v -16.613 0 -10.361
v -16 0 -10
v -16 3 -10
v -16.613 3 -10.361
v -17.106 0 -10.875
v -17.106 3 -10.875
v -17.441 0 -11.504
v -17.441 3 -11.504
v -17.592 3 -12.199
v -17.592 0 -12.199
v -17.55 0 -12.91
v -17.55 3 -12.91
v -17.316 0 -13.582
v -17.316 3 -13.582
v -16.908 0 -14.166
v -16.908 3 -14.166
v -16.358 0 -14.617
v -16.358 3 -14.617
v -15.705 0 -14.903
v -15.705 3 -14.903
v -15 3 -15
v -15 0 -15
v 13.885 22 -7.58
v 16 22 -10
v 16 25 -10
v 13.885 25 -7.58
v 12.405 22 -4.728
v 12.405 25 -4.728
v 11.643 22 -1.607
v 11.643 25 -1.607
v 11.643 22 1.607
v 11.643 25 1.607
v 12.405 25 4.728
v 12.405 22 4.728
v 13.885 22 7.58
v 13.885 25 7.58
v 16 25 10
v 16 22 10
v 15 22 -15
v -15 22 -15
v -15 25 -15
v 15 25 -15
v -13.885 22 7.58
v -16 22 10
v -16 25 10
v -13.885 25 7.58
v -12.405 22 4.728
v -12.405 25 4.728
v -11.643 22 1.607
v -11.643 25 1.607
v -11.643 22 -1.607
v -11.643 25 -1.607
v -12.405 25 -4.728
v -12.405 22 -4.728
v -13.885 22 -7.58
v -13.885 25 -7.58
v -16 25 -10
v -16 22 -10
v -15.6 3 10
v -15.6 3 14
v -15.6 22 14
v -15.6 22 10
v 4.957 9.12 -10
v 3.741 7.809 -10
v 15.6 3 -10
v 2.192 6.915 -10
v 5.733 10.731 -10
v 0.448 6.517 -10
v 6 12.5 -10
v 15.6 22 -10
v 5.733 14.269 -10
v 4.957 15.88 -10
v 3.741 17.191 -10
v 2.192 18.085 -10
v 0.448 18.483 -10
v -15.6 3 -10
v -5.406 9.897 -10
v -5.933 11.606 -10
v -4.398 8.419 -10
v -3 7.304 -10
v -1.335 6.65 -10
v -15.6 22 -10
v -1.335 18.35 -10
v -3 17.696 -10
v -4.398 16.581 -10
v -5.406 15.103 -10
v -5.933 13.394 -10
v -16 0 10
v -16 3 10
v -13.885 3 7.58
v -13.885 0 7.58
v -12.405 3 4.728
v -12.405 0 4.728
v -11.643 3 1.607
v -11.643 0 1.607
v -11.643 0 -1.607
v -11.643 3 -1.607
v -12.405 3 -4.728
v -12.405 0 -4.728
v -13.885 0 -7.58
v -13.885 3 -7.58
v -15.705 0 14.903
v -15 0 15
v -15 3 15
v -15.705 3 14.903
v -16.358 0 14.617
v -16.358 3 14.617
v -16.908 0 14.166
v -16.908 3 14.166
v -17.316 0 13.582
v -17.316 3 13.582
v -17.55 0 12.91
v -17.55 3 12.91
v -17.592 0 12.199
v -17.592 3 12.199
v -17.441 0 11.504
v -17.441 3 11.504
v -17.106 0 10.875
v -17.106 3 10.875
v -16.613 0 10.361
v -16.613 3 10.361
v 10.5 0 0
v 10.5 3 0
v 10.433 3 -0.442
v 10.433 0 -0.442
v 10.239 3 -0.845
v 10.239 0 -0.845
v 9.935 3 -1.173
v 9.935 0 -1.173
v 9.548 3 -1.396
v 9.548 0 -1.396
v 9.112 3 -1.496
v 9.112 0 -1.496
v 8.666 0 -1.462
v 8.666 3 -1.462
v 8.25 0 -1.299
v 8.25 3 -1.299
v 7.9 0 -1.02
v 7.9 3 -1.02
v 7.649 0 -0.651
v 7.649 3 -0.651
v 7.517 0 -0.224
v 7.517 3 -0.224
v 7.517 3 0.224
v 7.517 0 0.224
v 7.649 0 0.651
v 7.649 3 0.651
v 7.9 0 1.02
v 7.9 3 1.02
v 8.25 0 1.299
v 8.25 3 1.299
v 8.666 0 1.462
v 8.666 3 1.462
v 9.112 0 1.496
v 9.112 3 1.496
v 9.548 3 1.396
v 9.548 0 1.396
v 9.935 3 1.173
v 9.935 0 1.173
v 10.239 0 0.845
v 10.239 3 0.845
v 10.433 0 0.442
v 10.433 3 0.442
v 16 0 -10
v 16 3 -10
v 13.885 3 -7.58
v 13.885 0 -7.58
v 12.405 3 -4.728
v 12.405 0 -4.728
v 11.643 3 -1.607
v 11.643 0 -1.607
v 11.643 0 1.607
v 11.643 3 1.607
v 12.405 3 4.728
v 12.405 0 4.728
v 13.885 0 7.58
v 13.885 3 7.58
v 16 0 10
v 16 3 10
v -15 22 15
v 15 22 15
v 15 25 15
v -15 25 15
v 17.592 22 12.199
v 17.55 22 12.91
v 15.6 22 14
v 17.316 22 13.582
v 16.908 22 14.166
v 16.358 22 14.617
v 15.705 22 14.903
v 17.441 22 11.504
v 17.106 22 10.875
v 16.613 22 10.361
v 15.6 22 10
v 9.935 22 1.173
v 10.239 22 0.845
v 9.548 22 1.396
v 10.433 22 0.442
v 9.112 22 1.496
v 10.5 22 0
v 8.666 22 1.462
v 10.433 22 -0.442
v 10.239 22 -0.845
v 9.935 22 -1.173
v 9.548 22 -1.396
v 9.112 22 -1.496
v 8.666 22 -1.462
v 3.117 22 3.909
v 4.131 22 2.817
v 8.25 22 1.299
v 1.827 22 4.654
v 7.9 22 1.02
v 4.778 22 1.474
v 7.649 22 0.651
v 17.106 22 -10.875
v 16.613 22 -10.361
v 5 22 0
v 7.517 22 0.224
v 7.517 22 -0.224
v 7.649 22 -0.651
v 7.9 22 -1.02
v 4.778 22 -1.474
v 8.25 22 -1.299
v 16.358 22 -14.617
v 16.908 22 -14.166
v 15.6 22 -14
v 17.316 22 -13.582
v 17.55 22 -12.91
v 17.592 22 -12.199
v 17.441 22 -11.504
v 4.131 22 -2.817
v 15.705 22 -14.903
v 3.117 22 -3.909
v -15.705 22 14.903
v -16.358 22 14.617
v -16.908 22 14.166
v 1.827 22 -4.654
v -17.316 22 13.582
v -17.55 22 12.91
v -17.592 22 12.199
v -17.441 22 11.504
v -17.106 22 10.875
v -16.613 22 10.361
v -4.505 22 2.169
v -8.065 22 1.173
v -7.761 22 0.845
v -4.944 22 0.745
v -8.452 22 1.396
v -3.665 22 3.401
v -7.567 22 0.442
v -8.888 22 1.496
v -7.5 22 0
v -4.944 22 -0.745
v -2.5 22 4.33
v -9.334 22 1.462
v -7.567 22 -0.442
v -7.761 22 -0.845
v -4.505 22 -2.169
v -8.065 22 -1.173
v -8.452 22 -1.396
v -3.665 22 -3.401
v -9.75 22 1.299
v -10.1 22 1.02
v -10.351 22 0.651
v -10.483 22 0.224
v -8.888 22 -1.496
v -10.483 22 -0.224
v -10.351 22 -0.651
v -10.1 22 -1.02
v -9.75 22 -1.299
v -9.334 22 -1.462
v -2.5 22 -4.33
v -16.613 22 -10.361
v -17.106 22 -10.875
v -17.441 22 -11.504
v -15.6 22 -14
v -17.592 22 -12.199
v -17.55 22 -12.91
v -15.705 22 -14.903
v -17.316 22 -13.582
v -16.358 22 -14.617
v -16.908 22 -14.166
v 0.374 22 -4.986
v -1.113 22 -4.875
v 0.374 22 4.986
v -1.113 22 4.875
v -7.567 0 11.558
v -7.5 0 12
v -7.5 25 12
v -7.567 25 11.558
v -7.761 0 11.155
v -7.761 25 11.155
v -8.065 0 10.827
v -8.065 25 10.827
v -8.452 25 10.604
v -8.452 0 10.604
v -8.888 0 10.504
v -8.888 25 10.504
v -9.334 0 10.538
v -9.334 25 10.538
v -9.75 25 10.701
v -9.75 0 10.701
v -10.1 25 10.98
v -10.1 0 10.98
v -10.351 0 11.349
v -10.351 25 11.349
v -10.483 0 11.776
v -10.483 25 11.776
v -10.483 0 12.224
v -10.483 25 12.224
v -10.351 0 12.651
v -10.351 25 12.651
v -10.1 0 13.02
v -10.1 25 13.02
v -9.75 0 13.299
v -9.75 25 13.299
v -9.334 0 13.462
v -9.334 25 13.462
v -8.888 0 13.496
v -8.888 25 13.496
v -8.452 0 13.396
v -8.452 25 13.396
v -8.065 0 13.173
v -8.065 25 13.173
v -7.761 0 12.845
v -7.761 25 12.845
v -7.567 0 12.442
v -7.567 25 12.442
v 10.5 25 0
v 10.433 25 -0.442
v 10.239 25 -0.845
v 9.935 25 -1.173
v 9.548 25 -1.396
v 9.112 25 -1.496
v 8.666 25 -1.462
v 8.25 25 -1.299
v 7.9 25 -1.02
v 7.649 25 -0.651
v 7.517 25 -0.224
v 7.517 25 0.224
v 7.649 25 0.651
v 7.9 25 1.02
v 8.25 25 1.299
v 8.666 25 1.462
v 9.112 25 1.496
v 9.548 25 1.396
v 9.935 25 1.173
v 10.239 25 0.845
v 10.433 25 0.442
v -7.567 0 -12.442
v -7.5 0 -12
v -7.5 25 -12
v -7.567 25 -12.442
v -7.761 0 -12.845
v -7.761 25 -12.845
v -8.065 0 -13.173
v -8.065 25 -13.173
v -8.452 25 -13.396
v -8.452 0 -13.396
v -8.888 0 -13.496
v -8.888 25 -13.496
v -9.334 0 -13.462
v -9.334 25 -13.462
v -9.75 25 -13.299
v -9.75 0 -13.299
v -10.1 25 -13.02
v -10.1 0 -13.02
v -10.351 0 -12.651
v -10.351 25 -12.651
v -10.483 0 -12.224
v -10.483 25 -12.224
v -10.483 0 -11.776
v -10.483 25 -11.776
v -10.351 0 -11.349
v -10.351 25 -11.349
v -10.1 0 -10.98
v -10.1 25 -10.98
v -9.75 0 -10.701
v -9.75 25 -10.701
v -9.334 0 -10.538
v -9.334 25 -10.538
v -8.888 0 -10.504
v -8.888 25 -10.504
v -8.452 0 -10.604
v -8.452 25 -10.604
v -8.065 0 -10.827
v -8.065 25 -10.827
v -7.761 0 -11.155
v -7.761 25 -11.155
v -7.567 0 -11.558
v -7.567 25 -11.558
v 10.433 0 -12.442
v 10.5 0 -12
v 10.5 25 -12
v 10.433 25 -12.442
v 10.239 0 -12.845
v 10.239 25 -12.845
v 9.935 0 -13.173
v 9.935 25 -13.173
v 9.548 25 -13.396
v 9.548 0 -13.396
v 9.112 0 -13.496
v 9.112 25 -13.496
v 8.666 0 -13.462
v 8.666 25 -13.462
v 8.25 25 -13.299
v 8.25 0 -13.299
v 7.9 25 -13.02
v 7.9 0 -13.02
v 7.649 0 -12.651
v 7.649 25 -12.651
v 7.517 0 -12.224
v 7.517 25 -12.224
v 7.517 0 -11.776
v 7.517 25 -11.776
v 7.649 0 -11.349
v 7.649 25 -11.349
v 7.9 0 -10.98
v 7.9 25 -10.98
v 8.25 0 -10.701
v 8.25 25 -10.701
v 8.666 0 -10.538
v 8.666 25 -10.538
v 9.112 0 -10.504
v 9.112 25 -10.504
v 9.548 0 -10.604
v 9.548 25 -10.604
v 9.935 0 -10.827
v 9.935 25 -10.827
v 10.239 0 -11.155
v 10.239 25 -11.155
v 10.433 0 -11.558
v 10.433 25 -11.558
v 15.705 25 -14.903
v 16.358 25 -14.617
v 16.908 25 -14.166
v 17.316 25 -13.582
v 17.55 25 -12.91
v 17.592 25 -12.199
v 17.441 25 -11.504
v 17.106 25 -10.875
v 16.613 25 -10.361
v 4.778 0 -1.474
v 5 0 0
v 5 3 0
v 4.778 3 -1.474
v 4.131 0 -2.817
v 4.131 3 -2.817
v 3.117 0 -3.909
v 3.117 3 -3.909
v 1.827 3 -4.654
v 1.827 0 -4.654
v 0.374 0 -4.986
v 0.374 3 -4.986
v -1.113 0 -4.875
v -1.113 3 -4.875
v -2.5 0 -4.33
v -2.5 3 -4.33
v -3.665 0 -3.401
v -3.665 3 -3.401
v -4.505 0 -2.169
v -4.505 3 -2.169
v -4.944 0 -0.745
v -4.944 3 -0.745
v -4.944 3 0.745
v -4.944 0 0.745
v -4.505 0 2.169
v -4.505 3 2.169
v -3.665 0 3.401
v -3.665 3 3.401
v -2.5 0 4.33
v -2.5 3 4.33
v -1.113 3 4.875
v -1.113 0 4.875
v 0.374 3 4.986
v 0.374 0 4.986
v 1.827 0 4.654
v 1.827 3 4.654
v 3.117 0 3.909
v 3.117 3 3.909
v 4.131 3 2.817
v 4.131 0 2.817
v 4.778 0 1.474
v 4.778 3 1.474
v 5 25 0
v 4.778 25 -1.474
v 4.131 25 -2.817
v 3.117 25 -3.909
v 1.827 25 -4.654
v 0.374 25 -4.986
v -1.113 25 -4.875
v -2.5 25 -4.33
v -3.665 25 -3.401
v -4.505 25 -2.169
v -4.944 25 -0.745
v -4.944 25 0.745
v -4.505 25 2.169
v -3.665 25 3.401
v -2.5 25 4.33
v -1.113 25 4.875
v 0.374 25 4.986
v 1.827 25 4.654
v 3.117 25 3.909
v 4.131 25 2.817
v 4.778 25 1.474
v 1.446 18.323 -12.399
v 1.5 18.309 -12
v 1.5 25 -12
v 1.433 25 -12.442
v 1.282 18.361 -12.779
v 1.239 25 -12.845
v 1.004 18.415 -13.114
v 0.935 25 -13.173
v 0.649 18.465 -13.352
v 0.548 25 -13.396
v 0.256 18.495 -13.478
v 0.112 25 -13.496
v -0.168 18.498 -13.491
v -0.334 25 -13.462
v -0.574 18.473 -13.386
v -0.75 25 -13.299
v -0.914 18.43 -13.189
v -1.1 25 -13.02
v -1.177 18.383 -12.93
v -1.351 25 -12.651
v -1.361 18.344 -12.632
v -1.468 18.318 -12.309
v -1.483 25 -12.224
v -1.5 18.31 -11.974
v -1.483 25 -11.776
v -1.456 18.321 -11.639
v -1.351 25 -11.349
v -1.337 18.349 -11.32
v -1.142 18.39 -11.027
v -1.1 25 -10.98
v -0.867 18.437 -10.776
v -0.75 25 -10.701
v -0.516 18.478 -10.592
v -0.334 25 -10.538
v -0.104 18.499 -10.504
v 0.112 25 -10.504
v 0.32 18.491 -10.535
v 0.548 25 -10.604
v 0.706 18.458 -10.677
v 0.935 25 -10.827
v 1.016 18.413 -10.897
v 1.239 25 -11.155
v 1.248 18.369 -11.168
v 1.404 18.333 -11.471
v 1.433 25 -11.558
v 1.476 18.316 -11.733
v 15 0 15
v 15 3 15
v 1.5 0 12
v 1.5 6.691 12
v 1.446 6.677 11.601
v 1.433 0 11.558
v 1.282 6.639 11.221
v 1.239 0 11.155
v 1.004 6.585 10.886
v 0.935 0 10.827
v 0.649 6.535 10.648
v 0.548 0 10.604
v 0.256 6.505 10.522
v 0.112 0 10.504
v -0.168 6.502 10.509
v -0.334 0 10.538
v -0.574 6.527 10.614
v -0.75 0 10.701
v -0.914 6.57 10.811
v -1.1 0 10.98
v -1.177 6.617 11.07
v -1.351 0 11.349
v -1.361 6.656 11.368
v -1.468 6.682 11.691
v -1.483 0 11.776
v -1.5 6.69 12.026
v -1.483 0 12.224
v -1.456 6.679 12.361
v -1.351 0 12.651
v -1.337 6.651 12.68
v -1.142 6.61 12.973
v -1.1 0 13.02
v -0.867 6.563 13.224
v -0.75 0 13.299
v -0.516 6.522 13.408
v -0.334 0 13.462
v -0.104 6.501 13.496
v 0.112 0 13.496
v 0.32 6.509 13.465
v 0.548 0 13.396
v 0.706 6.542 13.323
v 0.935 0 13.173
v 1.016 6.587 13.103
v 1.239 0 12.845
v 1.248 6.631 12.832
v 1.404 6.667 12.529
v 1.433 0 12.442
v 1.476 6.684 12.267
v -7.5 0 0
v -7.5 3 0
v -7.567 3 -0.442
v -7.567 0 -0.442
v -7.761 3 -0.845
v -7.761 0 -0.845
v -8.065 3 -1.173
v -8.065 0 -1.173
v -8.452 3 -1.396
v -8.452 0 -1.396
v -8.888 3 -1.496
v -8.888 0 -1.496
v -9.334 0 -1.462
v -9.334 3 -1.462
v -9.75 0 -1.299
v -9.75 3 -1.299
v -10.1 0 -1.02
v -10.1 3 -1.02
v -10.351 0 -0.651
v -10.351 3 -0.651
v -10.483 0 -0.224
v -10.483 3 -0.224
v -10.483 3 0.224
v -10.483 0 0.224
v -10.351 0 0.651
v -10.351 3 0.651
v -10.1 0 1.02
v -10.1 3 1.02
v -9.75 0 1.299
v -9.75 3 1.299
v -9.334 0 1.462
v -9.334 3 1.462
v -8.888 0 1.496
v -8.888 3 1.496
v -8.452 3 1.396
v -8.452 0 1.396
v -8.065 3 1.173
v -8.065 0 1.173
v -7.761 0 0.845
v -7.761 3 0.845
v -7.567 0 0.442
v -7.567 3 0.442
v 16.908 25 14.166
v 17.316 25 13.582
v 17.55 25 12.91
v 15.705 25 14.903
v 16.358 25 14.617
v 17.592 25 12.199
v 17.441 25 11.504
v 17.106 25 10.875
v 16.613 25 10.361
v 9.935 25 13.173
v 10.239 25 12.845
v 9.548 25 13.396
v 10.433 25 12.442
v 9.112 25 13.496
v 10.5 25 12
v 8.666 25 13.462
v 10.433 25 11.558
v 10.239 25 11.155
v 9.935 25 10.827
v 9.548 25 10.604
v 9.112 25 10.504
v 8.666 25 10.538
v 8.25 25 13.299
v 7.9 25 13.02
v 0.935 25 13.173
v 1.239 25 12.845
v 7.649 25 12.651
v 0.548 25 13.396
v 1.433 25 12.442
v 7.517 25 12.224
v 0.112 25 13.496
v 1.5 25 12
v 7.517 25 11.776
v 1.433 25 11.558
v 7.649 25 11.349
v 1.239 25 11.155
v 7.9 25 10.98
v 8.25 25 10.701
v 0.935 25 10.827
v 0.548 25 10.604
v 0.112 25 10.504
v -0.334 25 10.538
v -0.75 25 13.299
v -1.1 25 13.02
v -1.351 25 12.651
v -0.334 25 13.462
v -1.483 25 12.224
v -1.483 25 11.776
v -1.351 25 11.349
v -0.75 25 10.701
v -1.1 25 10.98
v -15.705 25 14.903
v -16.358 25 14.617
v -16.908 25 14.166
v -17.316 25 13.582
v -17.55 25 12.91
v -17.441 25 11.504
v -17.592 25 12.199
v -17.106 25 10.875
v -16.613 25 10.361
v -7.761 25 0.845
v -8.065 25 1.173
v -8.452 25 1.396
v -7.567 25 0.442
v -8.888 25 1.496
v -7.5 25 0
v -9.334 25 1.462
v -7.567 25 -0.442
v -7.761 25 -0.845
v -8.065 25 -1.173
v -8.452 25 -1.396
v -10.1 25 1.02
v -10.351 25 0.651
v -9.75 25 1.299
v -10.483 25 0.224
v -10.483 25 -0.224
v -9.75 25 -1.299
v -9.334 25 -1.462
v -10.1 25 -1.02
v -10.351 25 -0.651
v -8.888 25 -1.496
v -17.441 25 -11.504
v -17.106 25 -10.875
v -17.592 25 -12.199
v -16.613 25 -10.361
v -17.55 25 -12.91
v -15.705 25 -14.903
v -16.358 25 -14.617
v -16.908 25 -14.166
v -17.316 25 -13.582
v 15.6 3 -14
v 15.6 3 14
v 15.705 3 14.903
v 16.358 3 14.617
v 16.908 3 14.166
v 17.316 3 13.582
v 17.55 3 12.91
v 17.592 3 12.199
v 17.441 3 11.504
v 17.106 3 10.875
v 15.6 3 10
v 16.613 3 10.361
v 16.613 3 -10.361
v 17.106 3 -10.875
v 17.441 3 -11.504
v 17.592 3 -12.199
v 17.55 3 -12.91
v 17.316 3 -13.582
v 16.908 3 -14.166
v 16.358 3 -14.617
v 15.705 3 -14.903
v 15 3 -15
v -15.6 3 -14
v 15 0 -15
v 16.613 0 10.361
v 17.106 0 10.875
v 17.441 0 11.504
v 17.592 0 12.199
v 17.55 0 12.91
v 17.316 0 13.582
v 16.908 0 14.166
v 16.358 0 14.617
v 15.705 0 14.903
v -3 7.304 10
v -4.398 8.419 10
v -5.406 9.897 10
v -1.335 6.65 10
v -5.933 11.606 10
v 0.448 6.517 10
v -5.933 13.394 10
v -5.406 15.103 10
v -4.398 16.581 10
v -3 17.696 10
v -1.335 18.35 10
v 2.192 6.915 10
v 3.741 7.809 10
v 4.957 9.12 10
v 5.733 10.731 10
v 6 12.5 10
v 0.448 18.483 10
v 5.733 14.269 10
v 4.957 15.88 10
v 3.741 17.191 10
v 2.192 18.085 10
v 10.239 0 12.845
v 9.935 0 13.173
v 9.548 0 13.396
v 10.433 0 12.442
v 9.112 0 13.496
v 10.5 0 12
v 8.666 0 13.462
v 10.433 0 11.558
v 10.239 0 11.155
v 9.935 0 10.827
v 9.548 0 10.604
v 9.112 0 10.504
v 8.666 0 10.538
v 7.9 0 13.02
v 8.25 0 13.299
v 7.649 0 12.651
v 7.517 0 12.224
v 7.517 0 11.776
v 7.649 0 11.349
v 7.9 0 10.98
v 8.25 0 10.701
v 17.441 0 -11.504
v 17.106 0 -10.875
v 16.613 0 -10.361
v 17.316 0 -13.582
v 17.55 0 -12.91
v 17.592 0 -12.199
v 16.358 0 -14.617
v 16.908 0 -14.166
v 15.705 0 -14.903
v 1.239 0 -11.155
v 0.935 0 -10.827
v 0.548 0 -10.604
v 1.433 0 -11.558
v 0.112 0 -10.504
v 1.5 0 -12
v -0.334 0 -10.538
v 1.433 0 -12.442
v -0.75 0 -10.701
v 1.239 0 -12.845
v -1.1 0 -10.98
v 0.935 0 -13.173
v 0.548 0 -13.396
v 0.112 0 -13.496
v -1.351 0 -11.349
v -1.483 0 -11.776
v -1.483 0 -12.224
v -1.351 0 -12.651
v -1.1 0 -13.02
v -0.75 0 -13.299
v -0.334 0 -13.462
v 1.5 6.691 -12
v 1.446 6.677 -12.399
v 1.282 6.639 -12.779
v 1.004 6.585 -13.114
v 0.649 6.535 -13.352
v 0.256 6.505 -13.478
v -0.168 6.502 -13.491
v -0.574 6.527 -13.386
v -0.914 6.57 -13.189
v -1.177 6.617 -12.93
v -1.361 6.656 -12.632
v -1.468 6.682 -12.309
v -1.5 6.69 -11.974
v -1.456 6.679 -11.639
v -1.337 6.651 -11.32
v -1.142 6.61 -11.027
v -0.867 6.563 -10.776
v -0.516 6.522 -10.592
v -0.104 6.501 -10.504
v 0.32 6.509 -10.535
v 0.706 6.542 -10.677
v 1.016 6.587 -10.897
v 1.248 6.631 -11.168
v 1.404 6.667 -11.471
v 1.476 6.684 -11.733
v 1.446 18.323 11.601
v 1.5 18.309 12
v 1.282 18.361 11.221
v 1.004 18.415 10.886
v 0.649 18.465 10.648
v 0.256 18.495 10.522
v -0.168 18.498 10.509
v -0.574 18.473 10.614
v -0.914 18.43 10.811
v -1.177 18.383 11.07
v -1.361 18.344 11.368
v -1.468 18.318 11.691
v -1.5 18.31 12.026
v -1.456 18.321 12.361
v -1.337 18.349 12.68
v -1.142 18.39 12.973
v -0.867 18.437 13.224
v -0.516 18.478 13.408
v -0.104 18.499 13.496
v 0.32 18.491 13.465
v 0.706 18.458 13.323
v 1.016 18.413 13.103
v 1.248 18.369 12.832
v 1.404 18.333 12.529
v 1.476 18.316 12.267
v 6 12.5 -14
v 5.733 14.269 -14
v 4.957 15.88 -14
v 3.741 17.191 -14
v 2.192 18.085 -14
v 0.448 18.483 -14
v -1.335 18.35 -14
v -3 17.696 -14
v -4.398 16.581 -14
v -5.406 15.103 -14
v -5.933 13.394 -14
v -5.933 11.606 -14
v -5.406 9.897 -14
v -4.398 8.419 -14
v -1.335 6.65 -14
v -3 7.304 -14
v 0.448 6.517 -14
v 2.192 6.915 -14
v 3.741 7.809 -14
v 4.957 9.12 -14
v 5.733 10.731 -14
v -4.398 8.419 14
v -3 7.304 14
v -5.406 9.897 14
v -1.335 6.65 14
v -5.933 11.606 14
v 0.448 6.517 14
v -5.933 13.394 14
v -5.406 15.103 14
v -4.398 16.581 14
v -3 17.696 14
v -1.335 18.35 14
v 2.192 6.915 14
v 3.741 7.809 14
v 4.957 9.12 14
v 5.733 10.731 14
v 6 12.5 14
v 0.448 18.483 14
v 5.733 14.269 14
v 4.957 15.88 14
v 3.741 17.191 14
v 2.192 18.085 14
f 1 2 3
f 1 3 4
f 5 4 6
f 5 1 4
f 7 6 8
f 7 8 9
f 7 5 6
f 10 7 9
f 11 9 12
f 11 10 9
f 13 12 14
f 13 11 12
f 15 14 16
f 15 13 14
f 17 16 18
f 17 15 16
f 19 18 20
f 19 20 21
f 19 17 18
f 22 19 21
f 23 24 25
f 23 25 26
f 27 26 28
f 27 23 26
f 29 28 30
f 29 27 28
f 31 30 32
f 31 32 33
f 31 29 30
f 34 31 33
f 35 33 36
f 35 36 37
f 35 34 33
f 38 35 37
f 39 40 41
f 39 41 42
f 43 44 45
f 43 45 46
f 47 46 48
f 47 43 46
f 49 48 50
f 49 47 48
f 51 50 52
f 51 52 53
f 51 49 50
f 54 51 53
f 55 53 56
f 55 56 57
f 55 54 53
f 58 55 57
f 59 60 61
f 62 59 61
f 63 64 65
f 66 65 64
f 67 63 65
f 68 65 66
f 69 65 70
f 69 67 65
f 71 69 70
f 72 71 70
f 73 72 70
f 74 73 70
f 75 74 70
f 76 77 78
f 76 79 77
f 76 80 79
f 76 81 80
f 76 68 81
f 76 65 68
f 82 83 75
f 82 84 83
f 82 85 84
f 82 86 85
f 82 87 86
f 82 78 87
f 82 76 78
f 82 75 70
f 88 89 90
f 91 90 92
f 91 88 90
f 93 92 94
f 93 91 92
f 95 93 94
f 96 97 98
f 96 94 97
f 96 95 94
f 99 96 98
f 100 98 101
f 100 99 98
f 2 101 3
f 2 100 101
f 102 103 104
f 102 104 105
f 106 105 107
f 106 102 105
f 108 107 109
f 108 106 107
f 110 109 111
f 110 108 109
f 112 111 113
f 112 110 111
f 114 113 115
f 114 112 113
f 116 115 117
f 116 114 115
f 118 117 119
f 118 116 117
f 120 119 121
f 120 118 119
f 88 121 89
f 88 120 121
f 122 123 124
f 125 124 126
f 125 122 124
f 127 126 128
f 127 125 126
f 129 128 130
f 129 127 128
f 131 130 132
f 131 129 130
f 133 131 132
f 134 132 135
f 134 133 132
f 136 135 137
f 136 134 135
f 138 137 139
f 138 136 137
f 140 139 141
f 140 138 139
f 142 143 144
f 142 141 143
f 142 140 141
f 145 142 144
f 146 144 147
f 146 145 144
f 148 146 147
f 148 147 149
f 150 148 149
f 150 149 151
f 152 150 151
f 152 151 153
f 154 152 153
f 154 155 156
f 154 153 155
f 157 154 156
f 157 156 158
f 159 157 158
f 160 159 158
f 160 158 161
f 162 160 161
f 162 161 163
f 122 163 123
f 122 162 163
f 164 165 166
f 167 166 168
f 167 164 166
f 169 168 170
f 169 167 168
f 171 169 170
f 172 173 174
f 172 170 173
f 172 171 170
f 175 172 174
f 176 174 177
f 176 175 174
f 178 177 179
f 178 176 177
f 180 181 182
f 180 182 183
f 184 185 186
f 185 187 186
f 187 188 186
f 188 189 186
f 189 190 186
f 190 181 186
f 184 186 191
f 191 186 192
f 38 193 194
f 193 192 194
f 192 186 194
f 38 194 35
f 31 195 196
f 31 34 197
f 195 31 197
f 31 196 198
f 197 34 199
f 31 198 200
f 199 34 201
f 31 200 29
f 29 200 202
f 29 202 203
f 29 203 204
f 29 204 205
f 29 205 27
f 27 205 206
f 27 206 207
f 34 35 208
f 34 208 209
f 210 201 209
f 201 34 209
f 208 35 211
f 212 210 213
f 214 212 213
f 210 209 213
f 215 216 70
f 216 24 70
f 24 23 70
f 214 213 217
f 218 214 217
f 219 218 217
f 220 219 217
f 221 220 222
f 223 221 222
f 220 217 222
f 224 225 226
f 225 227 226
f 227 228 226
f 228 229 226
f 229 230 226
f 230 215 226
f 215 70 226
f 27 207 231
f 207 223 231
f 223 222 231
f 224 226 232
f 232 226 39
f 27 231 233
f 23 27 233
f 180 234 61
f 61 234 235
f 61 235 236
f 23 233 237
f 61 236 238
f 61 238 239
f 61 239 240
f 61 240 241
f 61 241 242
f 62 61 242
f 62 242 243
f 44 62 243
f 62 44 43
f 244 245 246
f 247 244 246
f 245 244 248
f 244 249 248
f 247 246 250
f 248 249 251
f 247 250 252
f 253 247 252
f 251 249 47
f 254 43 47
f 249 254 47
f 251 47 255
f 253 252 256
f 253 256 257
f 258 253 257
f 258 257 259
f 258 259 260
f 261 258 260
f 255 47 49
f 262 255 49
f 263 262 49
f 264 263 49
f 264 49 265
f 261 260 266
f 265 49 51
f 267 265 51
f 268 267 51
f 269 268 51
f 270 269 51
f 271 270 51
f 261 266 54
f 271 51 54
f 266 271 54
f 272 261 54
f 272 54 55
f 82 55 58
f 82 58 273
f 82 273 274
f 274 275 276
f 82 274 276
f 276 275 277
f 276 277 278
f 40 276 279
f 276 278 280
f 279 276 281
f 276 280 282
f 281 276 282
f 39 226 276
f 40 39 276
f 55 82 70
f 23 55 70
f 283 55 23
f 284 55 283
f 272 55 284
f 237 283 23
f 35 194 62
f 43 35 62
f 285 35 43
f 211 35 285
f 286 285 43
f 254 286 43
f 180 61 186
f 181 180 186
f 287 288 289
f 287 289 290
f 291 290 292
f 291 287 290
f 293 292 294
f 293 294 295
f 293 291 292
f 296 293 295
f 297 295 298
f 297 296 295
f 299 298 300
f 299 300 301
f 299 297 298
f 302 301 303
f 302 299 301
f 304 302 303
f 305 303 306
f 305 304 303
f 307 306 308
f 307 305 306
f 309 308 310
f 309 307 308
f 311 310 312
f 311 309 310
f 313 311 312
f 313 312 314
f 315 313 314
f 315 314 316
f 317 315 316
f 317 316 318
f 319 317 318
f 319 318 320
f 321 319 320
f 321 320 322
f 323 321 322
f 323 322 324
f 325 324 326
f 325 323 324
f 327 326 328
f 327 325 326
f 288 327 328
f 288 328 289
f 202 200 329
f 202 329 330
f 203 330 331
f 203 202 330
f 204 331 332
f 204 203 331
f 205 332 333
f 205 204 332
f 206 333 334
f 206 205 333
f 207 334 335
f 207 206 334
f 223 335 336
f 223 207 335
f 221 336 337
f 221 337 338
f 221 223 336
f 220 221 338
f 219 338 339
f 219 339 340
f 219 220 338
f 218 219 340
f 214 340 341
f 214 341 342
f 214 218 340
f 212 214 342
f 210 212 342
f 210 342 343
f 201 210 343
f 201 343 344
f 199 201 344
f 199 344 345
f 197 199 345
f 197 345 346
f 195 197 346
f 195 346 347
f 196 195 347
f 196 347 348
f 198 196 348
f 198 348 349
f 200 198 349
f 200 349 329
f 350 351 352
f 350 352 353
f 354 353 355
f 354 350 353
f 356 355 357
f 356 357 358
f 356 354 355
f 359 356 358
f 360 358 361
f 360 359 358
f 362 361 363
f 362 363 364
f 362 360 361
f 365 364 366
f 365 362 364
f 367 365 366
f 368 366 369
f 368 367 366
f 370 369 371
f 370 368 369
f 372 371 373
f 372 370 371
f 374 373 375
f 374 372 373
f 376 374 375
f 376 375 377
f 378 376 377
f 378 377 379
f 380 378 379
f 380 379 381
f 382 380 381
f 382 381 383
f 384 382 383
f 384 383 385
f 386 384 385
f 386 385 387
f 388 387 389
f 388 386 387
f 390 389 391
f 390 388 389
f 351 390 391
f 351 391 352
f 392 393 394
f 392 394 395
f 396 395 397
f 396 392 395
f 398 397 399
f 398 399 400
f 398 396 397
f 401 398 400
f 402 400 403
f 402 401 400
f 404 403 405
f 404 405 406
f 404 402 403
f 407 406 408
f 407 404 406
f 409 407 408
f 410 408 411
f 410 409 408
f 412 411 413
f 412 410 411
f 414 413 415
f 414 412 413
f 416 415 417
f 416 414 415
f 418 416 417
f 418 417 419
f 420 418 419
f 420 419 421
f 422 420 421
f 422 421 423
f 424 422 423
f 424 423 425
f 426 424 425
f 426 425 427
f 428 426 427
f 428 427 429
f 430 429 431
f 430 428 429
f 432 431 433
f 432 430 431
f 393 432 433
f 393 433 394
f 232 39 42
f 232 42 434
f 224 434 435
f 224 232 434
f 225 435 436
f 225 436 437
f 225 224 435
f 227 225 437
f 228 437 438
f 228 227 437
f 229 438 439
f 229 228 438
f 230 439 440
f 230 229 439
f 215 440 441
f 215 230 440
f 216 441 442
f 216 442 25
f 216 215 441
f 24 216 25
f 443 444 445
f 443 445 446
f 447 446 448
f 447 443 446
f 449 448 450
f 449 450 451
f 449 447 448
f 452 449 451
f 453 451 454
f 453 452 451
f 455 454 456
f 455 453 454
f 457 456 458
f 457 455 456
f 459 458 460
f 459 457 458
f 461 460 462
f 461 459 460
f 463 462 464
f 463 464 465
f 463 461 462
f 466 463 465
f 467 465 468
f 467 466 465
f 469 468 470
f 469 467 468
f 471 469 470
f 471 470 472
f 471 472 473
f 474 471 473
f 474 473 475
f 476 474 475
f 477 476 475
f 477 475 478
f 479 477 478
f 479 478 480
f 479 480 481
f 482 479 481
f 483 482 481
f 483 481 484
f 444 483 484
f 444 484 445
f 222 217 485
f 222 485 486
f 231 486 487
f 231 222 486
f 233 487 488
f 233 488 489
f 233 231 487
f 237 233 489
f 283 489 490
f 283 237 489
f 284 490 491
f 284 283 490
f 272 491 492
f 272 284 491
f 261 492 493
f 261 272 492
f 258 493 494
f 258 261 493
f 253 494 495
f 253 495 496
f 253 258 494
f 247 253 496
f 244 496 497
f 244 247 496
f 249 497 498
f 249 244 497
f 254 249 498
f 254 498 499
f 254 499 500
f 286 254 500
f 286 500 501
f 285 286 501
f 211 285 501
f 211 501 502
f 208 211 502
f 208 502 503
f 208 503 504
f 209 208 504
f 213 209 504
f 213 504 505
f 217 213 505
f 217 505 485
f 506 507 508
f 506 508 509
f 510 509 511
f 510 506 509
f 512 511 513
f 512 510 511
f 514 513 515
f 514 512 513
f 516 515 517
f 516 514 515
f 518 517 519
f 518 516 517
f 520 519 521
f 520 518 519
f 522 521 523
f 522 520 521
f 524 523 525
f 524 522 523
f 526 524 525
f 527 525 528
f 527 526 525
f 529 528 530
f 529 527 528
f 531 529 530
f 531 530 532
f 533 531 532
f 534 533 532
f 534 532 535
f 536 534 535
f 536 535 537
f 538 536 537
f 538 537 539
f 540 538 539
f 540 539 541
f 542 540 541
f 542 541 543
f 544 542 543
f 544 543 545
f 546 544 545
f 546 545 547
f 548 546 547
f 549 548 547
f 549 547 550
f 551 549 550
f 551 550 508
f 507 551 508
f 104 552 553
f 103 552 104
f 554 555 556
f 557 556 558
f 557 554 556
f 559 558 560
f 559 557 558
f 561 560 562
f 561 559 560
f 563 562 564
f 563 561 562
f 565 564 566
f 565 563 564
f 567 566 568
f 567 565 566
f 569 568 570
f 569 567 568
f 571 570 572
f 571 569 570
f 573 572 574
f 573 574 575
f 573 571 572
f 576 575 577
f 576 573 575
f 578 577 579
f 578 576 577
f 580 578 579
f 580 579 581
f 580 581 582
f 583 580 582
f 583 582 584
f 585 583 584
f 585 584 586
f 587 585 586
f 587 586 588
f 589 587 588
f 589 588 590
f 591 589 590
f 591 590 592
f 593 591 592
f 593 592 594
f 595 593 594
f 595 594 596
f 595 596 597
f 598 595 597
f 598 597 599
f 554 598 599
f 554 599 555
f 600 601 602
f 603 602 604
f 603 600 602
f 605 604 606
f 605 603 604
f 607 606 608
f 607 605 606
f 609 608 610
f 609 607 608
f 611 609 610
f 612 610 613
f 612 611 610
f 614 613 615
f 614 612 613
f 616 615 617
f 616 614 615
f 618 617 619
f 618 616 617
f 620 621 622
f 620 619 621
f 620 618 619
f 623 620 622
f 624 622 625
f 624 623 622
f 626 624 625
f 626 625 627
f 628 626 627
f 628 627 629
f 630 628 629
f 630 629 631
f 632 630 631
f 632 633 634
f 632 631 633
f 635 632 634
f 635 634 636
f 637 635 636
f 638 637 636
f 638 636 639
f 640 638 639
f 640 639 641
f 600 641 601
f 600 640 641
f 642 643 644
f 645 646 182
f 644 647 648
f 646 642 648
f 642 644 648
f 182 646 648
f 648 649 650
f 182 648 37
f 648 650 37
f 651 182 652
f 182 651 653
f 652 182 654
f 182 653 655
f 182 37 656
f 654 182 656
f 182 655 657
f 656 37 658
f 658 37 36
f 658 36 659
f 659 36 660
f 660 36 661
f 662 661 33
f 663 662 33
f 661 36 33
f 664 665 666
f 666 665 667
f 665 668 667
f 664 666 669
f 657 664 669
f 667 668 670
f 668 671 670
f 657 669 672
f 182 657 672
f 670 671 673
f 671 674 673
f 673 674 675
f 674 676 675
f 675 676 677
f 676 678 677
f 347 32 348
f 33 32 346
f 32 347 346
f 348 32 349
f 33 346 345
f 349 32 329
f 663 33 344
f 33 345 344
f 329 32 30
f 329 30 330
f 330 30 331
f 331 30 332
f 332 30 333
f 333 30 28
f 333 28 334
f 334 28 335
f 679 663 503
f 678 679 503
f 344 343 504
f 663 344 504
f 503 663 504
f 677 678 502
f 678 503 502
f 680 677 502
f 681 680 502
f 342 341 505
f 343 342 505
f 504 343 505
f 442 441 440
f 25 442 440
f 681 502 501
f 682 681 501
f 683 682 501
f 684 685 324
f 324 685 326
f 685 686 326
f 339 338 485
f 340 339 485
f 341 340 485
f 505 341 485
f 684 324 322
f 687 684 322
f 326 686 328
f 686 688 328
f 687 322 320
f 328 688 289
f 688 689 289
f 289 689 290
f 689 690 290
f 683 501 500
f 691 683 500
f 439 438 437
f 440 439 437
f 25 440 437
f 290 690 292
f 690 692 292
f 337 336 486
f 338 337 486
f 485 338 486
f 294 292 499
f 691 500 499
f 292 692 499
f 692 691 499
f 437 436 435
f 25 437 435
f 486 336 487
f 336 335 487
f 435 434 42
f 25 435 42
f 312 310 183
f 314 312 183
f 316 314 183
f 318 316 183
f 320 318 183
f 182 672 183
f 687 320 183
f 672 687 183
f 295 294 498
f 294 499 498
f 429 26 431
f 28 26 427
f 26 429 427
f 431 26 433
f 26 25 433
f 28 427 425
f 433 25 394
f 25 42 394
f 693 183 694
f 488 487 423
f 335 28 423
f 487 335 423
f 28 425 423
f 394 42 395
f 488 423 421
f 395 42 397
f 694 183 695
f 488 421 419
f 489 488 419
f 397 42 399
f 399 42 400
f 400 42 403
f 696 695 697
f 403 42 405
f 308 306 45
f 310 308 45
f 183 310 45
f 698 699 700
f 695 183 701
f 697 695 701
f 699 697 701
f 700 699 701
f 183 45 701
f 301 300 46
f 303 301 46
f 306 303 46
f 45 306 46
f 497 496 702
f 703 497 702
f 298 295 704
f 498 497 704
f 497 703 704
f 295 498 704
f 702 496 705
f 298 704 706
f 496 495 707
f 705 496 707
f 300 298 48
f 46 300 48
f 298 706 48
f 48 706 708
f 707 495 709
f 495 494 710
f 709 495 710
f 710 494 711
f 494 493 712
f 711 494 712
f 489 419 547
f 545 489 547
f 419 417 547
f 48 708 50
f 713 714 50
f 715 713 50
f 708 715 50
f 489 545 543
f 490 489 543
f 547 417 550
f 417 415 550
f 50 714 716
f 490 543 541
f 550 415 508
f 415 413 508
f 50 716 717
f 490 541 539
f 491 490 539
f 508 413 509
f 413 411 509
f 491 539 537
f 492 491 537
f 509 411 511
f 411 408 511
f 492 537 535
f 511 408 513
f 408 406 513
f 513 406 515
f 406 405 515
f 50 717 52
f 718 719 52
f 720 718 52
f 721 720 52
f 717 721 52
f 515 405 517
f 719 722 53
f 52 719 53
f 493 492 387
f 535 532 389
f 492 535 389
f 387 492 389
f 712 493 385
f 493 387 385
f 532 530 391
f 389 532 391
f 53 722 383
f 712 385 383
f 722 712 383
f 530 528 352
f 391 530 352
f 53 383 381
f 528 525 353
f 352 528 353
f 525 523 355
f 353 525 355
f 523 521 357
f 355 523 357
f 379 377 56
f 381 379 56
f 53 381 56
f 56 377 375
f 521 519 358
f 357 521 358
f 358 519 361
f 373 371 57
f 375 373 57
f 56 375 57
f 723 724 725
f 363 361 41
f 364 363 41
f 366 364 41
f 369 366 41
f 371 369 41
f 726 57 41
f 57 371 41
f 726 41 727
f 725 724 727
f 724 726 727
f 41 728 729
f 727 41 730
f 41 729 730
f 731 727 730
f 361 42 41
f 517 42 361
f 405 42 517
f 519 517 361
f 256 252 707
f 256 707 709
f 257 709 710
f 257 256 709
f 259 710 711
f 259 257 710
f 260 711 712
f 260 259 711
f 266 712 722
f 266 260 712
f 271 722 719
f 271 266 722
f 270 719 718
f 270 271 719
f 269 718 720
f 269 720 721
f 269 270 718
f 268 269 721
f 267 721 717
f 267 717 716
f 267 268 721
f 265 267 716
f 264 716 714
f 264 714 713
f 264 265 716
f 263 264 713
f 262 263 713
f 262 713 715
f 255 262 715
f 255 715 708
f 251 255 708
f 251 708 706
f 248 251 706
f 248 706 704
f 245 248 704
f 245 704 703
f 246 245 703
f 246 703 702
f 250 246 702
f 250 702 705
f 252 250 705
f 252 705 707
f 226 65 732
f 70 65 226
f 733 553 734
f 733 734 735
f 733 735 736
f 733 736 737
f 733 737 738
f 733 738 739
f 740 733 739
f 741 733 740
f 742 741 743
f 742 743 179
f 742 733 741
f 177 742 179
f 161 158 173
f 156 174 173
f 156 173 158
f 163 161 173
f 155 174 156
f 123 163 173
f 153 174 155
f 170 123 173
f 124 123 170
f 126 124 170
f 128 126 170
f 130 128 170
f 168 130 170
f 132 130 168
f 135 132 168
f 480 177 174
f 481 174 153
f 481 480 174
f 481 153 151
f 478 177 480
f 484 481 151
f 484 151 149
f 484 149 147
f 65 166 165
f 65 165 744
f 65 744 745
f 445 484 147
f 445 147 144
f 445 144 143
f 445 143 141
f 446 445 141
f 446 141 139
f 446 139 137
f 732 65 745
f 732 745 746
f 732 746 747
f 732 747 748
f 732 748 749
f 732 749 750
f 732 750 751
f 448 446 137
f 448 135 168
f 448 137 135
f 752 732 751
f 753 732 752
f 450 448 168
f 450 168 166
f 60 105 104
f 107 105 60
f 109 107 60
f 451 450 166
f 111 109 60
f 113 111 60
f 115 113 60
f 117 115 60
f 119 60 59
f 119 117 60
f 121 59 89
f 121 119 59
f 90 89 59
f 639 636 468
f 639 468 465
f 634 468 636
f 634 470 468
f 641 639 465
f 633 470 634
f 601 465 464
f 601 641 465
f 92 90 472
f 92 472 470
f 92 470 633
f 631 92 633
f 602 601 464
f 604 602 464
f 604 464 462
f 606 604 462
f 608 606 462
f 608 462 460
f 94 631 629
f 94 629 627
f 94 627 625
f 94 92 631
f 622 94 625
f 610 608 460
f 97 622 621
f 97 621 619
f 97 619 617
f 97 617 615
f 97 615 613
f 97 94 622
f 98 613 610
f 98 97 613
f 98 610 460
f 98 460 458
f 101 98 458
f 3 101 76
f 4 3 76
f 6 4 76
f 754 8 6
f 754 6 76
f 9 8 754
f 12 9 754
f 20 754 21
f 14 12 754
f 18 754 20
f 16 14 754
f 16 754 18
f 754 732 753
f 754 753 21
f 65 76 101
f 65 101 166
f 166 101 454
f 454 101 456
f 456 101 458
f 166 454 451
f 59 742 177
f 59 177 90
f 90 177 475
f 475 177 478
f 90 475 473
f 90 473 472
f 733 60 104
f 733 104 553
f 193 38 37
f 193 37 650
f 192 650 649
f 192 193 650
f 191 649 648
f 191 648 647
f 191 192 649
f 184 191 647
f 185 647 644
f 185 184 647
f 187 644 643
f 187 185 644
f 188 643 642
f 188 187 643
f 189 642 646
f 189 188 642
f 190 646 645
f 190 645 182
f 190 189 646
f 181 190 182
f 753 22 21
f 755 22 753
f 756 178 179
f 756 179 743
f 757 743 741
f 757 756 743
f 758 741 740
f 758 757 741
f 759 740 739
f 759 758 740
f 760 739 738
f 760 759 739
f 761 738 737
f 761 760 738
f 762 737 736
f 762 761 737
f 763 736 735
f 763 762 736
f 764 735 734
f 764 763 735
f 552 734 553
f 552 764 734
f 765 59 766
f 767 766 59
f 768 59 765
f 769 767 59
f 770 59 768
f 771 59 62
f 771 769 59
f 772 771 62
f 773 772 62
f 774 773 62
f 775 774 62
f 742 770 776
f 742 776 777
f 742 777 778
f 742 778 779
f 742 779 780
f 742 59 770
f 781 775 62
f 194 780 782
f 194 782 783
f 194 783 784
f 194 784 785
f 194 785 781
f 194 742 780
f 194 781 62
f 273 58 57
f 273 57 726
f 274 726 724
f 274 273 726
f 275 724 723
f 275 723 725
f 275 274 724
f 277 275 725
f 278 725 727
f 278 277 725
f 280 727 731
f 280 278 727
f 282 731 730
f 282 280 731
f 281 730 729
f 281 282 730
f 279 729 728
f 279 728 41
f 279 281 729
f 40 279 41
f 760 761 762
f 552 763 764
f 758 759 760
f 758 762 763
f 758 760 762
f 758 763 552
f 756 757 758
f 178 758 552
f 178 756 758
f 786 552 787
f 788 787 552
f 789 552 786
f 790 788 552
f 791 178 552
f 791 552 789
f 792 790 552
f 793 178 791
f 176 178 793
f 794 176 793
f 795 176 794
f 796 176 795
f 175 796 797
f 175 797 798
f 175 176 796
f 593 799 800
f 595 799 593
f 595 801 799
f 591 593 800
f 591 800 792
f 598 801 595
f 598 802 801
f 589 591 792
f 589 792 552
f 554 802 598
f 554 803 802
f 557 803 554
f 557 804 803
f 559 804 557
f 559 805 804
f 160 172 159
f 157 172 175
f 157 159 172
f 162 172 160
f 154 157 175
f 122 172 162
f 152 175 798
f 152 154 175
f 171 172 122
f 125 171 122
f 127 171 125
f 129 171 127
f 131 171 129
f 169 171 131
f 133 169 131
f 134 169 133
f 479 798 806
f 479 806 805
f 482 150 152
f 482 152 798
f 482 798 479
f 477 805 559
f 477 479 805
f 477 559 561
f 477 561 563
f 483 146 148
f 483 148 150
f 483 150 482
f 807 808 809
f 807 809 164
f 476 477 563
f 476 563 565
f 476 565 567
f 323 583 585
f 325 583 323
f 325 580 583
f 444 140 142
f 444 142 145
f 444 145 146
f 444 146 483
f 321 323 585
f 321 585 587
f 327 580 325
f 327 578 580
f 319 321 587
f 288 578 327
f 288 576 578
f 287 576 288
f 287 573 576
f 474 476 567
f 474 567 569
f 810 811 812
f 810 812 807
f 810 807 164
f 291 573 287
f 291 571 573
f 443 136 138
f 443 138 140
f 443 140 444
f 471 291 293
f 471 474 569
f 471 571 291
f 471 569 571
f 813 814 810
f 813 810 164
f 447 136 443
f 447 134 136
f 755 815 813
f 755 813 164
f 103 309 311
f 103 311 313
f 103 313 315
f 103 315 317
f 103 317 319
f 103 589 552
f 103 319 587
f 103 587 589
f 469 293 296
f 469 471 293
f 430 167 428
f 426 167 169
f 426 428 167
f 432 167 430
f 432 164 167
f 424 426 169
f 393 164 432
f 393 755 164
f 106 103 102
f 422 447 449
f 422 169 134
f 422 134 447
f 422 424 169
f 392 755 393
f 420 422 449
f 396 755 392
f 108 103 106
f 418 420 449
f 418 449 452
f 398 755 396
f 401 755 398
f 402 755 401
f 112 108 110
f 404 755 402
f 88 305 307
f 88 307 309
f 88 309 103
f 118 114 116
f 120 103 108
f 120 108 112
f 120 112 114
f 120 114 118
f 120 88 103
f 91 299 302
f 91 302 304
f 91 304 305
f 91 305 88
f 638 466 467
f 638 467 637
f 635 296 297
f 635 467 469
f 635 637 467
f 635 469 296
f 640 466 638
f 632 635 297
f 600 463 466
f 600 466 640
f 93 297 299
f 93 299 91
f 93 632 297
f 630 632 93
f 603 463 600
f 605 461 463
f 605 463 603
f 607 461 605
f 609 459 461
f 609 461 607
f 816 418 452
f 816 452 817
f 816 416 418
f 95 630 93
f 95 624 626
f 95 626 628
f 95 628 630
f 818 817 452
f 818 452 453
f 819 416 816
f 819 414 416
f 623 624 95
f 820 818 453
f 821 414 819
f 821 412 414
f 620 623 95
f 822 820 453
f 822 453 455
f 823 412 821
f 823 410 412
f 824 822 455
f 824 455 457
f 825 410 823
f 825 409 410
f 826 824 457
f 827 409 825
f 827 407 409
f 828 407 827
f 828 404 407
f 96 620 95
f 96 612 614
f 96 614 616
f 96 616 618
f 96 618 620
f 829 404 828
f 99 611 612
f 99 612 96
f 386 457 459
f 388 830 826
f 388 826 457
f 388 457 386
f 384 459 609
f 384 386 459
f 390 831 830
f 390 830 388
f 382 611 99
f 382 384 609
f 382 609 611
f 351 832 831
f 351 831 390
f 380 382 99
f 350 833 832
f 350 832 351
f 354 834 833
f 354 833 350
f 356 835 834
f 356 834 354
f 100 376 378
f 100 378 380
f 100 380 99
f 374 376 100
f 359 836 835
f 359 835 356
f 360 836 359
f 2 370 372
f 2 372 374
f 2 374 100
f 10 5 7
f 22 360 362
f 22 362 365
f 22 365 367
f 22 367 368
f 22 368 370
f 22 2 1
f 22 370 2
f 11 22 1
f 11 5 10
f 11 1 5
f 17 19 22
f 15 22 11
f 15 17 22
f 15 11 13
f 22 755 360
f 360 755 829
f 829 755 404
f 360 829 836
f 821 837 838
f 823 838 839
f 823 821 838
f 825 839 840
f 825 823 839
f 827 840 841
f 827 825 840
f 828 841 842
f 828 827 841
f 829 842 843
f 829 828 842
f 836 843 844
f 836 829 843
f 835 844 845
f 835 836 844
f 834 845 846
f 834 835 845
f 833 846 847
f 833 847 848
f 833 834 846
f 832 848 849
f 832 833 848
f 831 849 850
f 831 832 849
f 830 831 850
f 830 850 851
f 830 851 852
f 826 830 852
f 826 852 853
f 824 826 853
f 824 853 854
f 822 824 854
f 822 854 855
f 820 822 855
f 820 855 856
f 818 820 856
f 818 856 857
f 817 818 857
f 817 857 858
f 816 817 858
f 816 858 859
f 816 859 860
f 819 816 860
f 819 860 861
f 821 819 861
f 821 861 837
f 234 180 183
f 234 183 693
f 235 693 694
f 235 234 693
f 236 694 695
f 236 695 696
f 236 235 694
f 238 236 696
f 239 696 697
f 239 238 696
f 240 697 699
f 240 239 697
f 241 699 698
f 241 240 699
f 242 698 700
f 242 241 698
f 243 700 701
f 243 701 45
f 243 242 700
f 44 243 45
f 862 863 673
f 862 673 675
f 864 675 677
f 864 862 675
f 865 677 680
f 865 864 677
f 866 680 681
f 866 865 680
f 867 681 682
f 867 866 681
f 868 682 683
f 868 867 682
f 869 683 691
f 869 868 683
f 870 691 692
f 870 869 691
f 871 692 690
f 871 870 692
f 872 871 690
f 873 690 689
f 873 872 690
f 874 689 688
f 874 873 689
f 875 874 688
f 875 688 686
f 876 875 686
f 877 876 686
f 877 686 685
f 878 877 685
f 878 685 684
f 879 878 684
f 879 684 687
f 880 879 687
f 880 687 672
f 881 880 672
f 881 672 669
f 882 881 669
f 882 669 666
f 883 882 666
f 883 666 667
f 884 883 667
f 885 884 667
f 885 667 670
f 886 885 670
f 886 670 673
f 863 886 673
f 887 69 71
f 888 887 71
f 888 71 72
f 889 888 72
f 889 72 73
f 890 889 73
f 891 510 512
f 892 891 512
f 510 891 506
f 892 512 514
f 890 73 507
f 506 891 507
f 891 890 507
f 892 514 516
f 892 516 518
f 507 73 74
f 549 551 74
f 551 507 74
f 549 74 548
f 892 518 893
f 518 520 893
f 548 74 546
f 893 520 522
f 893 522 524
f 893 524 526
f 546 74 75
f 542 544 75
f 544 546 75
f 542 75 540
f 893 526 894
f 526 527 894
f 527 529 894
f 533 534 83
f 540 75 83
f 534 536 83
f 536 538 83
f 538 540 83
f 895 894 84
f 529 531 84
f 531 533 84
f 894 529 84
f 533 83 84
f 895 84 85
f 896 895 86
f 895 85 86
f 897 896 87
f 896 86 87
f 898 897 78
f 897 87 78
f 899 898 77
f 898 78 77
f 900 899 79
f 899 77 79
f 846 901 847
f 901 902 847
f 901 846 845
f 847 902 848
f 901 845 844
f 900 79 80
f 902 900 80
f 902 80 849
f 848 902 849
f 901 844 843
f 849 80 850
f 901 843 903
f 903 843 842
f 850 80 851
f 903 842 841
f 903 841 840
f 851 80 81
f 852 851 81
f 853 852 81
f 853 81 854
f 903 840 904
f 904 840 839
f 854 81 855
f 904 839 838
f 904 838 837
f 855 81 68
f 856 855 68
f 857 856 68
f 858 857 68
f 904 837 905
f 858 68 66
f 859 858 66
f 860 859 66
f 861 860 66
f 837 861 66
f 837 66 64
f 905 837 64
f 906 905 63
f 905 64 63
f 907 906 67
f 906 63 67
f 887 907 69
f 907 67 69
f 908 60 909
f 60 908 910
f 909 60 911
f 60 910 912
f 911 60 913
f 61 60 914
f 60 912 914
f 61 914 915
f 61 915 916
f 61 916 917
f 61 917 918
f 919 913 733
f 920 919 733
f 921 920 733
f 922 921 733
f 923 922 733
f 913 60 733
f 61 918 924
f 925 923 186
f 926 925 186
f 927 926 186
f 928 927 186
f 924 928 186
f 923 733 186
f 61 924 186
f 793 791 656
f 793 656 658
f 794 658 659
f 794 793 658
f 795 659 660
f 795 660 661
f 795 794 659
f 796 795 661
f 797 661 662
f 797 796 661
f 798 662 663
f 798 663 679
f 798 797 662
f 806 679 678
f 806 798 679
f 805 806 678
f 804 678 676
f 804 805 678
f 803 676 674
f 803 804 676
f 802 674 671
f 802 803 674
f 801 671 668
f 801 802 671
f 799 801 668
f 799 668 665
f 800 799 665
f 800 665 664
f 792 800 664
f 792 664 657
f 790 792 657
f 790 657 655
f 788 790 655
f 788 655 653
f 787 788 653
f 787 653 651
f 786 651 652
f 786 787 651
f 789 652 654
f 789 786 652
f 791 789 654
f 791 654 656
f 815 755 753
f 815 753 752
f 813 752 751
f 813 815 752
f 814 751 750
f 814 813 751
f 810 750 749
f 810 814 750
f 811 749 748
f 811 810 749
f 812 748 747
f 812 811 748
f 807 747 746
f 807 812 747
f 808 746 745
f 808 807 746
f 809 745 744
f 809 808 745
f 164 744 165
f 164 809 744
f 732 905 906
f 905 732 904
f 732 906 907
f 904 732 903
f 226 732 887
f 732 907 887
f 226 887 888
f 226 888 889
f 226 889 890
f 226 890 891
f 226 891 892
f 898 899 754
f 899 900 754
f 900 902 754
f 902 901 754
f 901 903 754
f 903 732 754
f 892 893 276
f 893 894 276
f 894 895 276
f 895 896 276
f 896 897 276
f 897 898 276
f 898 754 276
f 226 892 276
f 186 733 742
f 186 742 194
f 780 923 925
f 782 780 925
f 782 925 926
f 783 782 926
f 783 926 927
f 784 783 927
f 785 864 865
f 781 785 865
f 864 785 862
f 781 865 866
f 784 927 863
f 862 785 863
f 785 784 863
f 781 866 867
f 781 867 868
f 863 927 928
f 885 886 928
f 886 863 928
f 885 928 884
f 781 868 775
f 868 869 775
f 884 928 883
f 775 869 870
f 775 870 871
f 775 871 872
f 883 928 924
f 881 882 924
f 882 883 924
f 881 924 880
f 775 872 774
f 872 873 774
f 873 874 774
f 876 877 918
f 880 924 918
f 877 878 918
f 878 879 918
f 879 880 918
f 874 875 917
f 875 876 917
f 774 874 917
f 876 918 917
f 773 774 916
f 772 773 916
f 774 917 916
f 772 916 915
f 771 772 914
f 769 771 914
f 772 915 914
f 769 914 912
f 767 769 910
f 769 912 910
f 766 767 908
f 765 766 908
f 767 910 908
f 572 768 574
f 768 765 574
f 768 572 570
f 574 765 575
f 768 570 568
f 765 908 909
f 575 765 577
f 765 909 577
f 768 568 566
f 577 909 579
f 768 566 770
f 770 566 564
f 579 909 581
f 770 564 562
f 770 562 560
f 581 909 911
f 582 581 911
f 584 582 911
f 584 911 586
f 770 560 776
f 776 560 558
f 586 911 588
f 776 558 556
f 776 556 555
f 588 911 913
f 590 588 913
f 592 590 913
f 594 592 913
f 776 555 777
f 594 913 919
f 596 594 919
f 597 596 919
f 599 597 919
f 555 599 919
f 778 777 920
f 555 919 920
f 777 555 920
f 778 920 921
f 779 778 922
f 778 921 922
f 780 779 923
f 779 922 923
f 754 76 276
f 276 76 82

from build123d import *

# Parameters (mm, degrees)
ESQUISSE1_R                  = 5
ESQUISSE1_R_2                = 1.5
BOSS_EXTRU_1_DEPTH           = 25
ENL_V_MAT_EXTRU_1_DEPTH      = 25
ENL_V_MAT_EXTRU_1_DEPTH_BACK = 25
ESQUISSE2_W                  = 20
ESQUISSE2_H                  = 19
ESQUISSE2_W_2                = 4.56072091
ESQUISSE2_W_3                = 3.825642854
ESQUISSE3_R                  = 6
ESQUISSE3_W                  = 8.37073205
ESQUISSE3_H                  = 19
ESQUISSE3_W_2                = 9.375022173
ENL_V_MAT_EXTRU_2_DEPTH      = 30


with BuildPart() as part:
    # Esquisse1 → Boss.-Extru.1 (new body)
    with BuildSketch(Plane(origin=(0, 0, 0), x_dir=(1, 0, 0), z_dir=(0, 1, 0))):
        with BuildLine():
            Line((-15, 15), (15, 15))
            ThreePointArc((15, 15), (17.549509757, 12.909901951), (16, 10))
            ThreePointArc((16, 10), (11.546375953, 0), (16, -10))
            ThreePointArc((16, -10), (17.549509757, -12.909901951), (15, -15))
            Line((15, -15), (-15, -15))
            ThreePointArc((-15, -15), (-17.549509757, -12.909901951), (-16, -10))
            ThreePointArc((-16, -10), (-11.546375953, 0), (-16, 10))
            ThreePointArc((-16, 10), (-17.549509757, 12.909901951), (-15, 15))
        make_face()
        Circle(ESQUISSE1_R, mode=Mode.SUBTRACT)
        with Locations((9, 0)):
            Circle(ESQUISSE1_R_2, mode=Mode.SUBTRACT)
        with Locations((-9, 0)):
            Circle(ESQUISSE1_R_2, mode=Mode.SUBTRACT)
        with Locations((-9, 12)):
            Circle(ESQUISSE1_R_2, mode=Mode.SUBTRACT)
        with Locations((9, 12)):
            Circle(ESQUISSE1_R_2, mode=Mode.SUBTRACT)
        with Locations((-9, -12)):
            Circle(ESQUISSE1_R_2, mode=Mode.SUBTRACT)
        with Locations((9, -12)):
            Circle(ESQUISSE1_R_2, mode=Mode.SUBTRACT)
        with Locations((0, -12)):
            Circle(ESQUISSE1_R_2, mode=Mode.SUBTRACT)
        with Locations((0, 12)):
            Circle(ESQUISSE1_R_2, mode=Mode.SUBTRACT)
    extrude(amount=BOSS_EXTRU_1_DEPTH)

    # Esquisse2 → Enlèv. mat.-Extru.1 (cut, two sides: drawn at the far end of the back side and taken through both)
    with BuildSketch(Plane(origin=(0, 0, 0), x_dir=(0, 0, -1), z_dir=(1, 0, 0)).offset(-ENL_V_MAT_EXTRU_1_DEPTH_BACK)):
        with Locations((0, 12.5)):
            Rectangle(ESQUISSE2_W, ESQUISSE2_H)
        with Locations((16.280360455, 12.5)):
            Rectangle(ESQUISSE2_W_2, ESQUISSE2_H)
        with Locations((-15.912821427, 12.5)):
            Rectangle(ESQUISSE2_W_3, ESQUISSE2_H)
    extrude(amount=ENL_V_MAT_EXTRU_1_DEPTH + ENL_V_MAT_EXTRU_1_DEPTH_BACK, mode=Mode.SUBTRACT)

    # Esquisse3 → Enlèv. mat.-Extru.2 (cut)
    with BuildSketch(Plane.XY.offset(14)):
        with Locations((0, 12.5)):
            Circle(ESQUISSE3_R)
        with Locations((-19.785366025, 12.5)):
            Rectangle(ESQUISSE3_W, ESQUISSE3_H)
        with Locations((20.287511087, 12.5)):
            Rectangle(ESQUISSE3_W_2, ESQUISSE3_H)
    extrude(amount=-ENL_V_MAT_EXTRU_2_DEPTH, mode=Mode.SUBTRACT)


solid = part.part
